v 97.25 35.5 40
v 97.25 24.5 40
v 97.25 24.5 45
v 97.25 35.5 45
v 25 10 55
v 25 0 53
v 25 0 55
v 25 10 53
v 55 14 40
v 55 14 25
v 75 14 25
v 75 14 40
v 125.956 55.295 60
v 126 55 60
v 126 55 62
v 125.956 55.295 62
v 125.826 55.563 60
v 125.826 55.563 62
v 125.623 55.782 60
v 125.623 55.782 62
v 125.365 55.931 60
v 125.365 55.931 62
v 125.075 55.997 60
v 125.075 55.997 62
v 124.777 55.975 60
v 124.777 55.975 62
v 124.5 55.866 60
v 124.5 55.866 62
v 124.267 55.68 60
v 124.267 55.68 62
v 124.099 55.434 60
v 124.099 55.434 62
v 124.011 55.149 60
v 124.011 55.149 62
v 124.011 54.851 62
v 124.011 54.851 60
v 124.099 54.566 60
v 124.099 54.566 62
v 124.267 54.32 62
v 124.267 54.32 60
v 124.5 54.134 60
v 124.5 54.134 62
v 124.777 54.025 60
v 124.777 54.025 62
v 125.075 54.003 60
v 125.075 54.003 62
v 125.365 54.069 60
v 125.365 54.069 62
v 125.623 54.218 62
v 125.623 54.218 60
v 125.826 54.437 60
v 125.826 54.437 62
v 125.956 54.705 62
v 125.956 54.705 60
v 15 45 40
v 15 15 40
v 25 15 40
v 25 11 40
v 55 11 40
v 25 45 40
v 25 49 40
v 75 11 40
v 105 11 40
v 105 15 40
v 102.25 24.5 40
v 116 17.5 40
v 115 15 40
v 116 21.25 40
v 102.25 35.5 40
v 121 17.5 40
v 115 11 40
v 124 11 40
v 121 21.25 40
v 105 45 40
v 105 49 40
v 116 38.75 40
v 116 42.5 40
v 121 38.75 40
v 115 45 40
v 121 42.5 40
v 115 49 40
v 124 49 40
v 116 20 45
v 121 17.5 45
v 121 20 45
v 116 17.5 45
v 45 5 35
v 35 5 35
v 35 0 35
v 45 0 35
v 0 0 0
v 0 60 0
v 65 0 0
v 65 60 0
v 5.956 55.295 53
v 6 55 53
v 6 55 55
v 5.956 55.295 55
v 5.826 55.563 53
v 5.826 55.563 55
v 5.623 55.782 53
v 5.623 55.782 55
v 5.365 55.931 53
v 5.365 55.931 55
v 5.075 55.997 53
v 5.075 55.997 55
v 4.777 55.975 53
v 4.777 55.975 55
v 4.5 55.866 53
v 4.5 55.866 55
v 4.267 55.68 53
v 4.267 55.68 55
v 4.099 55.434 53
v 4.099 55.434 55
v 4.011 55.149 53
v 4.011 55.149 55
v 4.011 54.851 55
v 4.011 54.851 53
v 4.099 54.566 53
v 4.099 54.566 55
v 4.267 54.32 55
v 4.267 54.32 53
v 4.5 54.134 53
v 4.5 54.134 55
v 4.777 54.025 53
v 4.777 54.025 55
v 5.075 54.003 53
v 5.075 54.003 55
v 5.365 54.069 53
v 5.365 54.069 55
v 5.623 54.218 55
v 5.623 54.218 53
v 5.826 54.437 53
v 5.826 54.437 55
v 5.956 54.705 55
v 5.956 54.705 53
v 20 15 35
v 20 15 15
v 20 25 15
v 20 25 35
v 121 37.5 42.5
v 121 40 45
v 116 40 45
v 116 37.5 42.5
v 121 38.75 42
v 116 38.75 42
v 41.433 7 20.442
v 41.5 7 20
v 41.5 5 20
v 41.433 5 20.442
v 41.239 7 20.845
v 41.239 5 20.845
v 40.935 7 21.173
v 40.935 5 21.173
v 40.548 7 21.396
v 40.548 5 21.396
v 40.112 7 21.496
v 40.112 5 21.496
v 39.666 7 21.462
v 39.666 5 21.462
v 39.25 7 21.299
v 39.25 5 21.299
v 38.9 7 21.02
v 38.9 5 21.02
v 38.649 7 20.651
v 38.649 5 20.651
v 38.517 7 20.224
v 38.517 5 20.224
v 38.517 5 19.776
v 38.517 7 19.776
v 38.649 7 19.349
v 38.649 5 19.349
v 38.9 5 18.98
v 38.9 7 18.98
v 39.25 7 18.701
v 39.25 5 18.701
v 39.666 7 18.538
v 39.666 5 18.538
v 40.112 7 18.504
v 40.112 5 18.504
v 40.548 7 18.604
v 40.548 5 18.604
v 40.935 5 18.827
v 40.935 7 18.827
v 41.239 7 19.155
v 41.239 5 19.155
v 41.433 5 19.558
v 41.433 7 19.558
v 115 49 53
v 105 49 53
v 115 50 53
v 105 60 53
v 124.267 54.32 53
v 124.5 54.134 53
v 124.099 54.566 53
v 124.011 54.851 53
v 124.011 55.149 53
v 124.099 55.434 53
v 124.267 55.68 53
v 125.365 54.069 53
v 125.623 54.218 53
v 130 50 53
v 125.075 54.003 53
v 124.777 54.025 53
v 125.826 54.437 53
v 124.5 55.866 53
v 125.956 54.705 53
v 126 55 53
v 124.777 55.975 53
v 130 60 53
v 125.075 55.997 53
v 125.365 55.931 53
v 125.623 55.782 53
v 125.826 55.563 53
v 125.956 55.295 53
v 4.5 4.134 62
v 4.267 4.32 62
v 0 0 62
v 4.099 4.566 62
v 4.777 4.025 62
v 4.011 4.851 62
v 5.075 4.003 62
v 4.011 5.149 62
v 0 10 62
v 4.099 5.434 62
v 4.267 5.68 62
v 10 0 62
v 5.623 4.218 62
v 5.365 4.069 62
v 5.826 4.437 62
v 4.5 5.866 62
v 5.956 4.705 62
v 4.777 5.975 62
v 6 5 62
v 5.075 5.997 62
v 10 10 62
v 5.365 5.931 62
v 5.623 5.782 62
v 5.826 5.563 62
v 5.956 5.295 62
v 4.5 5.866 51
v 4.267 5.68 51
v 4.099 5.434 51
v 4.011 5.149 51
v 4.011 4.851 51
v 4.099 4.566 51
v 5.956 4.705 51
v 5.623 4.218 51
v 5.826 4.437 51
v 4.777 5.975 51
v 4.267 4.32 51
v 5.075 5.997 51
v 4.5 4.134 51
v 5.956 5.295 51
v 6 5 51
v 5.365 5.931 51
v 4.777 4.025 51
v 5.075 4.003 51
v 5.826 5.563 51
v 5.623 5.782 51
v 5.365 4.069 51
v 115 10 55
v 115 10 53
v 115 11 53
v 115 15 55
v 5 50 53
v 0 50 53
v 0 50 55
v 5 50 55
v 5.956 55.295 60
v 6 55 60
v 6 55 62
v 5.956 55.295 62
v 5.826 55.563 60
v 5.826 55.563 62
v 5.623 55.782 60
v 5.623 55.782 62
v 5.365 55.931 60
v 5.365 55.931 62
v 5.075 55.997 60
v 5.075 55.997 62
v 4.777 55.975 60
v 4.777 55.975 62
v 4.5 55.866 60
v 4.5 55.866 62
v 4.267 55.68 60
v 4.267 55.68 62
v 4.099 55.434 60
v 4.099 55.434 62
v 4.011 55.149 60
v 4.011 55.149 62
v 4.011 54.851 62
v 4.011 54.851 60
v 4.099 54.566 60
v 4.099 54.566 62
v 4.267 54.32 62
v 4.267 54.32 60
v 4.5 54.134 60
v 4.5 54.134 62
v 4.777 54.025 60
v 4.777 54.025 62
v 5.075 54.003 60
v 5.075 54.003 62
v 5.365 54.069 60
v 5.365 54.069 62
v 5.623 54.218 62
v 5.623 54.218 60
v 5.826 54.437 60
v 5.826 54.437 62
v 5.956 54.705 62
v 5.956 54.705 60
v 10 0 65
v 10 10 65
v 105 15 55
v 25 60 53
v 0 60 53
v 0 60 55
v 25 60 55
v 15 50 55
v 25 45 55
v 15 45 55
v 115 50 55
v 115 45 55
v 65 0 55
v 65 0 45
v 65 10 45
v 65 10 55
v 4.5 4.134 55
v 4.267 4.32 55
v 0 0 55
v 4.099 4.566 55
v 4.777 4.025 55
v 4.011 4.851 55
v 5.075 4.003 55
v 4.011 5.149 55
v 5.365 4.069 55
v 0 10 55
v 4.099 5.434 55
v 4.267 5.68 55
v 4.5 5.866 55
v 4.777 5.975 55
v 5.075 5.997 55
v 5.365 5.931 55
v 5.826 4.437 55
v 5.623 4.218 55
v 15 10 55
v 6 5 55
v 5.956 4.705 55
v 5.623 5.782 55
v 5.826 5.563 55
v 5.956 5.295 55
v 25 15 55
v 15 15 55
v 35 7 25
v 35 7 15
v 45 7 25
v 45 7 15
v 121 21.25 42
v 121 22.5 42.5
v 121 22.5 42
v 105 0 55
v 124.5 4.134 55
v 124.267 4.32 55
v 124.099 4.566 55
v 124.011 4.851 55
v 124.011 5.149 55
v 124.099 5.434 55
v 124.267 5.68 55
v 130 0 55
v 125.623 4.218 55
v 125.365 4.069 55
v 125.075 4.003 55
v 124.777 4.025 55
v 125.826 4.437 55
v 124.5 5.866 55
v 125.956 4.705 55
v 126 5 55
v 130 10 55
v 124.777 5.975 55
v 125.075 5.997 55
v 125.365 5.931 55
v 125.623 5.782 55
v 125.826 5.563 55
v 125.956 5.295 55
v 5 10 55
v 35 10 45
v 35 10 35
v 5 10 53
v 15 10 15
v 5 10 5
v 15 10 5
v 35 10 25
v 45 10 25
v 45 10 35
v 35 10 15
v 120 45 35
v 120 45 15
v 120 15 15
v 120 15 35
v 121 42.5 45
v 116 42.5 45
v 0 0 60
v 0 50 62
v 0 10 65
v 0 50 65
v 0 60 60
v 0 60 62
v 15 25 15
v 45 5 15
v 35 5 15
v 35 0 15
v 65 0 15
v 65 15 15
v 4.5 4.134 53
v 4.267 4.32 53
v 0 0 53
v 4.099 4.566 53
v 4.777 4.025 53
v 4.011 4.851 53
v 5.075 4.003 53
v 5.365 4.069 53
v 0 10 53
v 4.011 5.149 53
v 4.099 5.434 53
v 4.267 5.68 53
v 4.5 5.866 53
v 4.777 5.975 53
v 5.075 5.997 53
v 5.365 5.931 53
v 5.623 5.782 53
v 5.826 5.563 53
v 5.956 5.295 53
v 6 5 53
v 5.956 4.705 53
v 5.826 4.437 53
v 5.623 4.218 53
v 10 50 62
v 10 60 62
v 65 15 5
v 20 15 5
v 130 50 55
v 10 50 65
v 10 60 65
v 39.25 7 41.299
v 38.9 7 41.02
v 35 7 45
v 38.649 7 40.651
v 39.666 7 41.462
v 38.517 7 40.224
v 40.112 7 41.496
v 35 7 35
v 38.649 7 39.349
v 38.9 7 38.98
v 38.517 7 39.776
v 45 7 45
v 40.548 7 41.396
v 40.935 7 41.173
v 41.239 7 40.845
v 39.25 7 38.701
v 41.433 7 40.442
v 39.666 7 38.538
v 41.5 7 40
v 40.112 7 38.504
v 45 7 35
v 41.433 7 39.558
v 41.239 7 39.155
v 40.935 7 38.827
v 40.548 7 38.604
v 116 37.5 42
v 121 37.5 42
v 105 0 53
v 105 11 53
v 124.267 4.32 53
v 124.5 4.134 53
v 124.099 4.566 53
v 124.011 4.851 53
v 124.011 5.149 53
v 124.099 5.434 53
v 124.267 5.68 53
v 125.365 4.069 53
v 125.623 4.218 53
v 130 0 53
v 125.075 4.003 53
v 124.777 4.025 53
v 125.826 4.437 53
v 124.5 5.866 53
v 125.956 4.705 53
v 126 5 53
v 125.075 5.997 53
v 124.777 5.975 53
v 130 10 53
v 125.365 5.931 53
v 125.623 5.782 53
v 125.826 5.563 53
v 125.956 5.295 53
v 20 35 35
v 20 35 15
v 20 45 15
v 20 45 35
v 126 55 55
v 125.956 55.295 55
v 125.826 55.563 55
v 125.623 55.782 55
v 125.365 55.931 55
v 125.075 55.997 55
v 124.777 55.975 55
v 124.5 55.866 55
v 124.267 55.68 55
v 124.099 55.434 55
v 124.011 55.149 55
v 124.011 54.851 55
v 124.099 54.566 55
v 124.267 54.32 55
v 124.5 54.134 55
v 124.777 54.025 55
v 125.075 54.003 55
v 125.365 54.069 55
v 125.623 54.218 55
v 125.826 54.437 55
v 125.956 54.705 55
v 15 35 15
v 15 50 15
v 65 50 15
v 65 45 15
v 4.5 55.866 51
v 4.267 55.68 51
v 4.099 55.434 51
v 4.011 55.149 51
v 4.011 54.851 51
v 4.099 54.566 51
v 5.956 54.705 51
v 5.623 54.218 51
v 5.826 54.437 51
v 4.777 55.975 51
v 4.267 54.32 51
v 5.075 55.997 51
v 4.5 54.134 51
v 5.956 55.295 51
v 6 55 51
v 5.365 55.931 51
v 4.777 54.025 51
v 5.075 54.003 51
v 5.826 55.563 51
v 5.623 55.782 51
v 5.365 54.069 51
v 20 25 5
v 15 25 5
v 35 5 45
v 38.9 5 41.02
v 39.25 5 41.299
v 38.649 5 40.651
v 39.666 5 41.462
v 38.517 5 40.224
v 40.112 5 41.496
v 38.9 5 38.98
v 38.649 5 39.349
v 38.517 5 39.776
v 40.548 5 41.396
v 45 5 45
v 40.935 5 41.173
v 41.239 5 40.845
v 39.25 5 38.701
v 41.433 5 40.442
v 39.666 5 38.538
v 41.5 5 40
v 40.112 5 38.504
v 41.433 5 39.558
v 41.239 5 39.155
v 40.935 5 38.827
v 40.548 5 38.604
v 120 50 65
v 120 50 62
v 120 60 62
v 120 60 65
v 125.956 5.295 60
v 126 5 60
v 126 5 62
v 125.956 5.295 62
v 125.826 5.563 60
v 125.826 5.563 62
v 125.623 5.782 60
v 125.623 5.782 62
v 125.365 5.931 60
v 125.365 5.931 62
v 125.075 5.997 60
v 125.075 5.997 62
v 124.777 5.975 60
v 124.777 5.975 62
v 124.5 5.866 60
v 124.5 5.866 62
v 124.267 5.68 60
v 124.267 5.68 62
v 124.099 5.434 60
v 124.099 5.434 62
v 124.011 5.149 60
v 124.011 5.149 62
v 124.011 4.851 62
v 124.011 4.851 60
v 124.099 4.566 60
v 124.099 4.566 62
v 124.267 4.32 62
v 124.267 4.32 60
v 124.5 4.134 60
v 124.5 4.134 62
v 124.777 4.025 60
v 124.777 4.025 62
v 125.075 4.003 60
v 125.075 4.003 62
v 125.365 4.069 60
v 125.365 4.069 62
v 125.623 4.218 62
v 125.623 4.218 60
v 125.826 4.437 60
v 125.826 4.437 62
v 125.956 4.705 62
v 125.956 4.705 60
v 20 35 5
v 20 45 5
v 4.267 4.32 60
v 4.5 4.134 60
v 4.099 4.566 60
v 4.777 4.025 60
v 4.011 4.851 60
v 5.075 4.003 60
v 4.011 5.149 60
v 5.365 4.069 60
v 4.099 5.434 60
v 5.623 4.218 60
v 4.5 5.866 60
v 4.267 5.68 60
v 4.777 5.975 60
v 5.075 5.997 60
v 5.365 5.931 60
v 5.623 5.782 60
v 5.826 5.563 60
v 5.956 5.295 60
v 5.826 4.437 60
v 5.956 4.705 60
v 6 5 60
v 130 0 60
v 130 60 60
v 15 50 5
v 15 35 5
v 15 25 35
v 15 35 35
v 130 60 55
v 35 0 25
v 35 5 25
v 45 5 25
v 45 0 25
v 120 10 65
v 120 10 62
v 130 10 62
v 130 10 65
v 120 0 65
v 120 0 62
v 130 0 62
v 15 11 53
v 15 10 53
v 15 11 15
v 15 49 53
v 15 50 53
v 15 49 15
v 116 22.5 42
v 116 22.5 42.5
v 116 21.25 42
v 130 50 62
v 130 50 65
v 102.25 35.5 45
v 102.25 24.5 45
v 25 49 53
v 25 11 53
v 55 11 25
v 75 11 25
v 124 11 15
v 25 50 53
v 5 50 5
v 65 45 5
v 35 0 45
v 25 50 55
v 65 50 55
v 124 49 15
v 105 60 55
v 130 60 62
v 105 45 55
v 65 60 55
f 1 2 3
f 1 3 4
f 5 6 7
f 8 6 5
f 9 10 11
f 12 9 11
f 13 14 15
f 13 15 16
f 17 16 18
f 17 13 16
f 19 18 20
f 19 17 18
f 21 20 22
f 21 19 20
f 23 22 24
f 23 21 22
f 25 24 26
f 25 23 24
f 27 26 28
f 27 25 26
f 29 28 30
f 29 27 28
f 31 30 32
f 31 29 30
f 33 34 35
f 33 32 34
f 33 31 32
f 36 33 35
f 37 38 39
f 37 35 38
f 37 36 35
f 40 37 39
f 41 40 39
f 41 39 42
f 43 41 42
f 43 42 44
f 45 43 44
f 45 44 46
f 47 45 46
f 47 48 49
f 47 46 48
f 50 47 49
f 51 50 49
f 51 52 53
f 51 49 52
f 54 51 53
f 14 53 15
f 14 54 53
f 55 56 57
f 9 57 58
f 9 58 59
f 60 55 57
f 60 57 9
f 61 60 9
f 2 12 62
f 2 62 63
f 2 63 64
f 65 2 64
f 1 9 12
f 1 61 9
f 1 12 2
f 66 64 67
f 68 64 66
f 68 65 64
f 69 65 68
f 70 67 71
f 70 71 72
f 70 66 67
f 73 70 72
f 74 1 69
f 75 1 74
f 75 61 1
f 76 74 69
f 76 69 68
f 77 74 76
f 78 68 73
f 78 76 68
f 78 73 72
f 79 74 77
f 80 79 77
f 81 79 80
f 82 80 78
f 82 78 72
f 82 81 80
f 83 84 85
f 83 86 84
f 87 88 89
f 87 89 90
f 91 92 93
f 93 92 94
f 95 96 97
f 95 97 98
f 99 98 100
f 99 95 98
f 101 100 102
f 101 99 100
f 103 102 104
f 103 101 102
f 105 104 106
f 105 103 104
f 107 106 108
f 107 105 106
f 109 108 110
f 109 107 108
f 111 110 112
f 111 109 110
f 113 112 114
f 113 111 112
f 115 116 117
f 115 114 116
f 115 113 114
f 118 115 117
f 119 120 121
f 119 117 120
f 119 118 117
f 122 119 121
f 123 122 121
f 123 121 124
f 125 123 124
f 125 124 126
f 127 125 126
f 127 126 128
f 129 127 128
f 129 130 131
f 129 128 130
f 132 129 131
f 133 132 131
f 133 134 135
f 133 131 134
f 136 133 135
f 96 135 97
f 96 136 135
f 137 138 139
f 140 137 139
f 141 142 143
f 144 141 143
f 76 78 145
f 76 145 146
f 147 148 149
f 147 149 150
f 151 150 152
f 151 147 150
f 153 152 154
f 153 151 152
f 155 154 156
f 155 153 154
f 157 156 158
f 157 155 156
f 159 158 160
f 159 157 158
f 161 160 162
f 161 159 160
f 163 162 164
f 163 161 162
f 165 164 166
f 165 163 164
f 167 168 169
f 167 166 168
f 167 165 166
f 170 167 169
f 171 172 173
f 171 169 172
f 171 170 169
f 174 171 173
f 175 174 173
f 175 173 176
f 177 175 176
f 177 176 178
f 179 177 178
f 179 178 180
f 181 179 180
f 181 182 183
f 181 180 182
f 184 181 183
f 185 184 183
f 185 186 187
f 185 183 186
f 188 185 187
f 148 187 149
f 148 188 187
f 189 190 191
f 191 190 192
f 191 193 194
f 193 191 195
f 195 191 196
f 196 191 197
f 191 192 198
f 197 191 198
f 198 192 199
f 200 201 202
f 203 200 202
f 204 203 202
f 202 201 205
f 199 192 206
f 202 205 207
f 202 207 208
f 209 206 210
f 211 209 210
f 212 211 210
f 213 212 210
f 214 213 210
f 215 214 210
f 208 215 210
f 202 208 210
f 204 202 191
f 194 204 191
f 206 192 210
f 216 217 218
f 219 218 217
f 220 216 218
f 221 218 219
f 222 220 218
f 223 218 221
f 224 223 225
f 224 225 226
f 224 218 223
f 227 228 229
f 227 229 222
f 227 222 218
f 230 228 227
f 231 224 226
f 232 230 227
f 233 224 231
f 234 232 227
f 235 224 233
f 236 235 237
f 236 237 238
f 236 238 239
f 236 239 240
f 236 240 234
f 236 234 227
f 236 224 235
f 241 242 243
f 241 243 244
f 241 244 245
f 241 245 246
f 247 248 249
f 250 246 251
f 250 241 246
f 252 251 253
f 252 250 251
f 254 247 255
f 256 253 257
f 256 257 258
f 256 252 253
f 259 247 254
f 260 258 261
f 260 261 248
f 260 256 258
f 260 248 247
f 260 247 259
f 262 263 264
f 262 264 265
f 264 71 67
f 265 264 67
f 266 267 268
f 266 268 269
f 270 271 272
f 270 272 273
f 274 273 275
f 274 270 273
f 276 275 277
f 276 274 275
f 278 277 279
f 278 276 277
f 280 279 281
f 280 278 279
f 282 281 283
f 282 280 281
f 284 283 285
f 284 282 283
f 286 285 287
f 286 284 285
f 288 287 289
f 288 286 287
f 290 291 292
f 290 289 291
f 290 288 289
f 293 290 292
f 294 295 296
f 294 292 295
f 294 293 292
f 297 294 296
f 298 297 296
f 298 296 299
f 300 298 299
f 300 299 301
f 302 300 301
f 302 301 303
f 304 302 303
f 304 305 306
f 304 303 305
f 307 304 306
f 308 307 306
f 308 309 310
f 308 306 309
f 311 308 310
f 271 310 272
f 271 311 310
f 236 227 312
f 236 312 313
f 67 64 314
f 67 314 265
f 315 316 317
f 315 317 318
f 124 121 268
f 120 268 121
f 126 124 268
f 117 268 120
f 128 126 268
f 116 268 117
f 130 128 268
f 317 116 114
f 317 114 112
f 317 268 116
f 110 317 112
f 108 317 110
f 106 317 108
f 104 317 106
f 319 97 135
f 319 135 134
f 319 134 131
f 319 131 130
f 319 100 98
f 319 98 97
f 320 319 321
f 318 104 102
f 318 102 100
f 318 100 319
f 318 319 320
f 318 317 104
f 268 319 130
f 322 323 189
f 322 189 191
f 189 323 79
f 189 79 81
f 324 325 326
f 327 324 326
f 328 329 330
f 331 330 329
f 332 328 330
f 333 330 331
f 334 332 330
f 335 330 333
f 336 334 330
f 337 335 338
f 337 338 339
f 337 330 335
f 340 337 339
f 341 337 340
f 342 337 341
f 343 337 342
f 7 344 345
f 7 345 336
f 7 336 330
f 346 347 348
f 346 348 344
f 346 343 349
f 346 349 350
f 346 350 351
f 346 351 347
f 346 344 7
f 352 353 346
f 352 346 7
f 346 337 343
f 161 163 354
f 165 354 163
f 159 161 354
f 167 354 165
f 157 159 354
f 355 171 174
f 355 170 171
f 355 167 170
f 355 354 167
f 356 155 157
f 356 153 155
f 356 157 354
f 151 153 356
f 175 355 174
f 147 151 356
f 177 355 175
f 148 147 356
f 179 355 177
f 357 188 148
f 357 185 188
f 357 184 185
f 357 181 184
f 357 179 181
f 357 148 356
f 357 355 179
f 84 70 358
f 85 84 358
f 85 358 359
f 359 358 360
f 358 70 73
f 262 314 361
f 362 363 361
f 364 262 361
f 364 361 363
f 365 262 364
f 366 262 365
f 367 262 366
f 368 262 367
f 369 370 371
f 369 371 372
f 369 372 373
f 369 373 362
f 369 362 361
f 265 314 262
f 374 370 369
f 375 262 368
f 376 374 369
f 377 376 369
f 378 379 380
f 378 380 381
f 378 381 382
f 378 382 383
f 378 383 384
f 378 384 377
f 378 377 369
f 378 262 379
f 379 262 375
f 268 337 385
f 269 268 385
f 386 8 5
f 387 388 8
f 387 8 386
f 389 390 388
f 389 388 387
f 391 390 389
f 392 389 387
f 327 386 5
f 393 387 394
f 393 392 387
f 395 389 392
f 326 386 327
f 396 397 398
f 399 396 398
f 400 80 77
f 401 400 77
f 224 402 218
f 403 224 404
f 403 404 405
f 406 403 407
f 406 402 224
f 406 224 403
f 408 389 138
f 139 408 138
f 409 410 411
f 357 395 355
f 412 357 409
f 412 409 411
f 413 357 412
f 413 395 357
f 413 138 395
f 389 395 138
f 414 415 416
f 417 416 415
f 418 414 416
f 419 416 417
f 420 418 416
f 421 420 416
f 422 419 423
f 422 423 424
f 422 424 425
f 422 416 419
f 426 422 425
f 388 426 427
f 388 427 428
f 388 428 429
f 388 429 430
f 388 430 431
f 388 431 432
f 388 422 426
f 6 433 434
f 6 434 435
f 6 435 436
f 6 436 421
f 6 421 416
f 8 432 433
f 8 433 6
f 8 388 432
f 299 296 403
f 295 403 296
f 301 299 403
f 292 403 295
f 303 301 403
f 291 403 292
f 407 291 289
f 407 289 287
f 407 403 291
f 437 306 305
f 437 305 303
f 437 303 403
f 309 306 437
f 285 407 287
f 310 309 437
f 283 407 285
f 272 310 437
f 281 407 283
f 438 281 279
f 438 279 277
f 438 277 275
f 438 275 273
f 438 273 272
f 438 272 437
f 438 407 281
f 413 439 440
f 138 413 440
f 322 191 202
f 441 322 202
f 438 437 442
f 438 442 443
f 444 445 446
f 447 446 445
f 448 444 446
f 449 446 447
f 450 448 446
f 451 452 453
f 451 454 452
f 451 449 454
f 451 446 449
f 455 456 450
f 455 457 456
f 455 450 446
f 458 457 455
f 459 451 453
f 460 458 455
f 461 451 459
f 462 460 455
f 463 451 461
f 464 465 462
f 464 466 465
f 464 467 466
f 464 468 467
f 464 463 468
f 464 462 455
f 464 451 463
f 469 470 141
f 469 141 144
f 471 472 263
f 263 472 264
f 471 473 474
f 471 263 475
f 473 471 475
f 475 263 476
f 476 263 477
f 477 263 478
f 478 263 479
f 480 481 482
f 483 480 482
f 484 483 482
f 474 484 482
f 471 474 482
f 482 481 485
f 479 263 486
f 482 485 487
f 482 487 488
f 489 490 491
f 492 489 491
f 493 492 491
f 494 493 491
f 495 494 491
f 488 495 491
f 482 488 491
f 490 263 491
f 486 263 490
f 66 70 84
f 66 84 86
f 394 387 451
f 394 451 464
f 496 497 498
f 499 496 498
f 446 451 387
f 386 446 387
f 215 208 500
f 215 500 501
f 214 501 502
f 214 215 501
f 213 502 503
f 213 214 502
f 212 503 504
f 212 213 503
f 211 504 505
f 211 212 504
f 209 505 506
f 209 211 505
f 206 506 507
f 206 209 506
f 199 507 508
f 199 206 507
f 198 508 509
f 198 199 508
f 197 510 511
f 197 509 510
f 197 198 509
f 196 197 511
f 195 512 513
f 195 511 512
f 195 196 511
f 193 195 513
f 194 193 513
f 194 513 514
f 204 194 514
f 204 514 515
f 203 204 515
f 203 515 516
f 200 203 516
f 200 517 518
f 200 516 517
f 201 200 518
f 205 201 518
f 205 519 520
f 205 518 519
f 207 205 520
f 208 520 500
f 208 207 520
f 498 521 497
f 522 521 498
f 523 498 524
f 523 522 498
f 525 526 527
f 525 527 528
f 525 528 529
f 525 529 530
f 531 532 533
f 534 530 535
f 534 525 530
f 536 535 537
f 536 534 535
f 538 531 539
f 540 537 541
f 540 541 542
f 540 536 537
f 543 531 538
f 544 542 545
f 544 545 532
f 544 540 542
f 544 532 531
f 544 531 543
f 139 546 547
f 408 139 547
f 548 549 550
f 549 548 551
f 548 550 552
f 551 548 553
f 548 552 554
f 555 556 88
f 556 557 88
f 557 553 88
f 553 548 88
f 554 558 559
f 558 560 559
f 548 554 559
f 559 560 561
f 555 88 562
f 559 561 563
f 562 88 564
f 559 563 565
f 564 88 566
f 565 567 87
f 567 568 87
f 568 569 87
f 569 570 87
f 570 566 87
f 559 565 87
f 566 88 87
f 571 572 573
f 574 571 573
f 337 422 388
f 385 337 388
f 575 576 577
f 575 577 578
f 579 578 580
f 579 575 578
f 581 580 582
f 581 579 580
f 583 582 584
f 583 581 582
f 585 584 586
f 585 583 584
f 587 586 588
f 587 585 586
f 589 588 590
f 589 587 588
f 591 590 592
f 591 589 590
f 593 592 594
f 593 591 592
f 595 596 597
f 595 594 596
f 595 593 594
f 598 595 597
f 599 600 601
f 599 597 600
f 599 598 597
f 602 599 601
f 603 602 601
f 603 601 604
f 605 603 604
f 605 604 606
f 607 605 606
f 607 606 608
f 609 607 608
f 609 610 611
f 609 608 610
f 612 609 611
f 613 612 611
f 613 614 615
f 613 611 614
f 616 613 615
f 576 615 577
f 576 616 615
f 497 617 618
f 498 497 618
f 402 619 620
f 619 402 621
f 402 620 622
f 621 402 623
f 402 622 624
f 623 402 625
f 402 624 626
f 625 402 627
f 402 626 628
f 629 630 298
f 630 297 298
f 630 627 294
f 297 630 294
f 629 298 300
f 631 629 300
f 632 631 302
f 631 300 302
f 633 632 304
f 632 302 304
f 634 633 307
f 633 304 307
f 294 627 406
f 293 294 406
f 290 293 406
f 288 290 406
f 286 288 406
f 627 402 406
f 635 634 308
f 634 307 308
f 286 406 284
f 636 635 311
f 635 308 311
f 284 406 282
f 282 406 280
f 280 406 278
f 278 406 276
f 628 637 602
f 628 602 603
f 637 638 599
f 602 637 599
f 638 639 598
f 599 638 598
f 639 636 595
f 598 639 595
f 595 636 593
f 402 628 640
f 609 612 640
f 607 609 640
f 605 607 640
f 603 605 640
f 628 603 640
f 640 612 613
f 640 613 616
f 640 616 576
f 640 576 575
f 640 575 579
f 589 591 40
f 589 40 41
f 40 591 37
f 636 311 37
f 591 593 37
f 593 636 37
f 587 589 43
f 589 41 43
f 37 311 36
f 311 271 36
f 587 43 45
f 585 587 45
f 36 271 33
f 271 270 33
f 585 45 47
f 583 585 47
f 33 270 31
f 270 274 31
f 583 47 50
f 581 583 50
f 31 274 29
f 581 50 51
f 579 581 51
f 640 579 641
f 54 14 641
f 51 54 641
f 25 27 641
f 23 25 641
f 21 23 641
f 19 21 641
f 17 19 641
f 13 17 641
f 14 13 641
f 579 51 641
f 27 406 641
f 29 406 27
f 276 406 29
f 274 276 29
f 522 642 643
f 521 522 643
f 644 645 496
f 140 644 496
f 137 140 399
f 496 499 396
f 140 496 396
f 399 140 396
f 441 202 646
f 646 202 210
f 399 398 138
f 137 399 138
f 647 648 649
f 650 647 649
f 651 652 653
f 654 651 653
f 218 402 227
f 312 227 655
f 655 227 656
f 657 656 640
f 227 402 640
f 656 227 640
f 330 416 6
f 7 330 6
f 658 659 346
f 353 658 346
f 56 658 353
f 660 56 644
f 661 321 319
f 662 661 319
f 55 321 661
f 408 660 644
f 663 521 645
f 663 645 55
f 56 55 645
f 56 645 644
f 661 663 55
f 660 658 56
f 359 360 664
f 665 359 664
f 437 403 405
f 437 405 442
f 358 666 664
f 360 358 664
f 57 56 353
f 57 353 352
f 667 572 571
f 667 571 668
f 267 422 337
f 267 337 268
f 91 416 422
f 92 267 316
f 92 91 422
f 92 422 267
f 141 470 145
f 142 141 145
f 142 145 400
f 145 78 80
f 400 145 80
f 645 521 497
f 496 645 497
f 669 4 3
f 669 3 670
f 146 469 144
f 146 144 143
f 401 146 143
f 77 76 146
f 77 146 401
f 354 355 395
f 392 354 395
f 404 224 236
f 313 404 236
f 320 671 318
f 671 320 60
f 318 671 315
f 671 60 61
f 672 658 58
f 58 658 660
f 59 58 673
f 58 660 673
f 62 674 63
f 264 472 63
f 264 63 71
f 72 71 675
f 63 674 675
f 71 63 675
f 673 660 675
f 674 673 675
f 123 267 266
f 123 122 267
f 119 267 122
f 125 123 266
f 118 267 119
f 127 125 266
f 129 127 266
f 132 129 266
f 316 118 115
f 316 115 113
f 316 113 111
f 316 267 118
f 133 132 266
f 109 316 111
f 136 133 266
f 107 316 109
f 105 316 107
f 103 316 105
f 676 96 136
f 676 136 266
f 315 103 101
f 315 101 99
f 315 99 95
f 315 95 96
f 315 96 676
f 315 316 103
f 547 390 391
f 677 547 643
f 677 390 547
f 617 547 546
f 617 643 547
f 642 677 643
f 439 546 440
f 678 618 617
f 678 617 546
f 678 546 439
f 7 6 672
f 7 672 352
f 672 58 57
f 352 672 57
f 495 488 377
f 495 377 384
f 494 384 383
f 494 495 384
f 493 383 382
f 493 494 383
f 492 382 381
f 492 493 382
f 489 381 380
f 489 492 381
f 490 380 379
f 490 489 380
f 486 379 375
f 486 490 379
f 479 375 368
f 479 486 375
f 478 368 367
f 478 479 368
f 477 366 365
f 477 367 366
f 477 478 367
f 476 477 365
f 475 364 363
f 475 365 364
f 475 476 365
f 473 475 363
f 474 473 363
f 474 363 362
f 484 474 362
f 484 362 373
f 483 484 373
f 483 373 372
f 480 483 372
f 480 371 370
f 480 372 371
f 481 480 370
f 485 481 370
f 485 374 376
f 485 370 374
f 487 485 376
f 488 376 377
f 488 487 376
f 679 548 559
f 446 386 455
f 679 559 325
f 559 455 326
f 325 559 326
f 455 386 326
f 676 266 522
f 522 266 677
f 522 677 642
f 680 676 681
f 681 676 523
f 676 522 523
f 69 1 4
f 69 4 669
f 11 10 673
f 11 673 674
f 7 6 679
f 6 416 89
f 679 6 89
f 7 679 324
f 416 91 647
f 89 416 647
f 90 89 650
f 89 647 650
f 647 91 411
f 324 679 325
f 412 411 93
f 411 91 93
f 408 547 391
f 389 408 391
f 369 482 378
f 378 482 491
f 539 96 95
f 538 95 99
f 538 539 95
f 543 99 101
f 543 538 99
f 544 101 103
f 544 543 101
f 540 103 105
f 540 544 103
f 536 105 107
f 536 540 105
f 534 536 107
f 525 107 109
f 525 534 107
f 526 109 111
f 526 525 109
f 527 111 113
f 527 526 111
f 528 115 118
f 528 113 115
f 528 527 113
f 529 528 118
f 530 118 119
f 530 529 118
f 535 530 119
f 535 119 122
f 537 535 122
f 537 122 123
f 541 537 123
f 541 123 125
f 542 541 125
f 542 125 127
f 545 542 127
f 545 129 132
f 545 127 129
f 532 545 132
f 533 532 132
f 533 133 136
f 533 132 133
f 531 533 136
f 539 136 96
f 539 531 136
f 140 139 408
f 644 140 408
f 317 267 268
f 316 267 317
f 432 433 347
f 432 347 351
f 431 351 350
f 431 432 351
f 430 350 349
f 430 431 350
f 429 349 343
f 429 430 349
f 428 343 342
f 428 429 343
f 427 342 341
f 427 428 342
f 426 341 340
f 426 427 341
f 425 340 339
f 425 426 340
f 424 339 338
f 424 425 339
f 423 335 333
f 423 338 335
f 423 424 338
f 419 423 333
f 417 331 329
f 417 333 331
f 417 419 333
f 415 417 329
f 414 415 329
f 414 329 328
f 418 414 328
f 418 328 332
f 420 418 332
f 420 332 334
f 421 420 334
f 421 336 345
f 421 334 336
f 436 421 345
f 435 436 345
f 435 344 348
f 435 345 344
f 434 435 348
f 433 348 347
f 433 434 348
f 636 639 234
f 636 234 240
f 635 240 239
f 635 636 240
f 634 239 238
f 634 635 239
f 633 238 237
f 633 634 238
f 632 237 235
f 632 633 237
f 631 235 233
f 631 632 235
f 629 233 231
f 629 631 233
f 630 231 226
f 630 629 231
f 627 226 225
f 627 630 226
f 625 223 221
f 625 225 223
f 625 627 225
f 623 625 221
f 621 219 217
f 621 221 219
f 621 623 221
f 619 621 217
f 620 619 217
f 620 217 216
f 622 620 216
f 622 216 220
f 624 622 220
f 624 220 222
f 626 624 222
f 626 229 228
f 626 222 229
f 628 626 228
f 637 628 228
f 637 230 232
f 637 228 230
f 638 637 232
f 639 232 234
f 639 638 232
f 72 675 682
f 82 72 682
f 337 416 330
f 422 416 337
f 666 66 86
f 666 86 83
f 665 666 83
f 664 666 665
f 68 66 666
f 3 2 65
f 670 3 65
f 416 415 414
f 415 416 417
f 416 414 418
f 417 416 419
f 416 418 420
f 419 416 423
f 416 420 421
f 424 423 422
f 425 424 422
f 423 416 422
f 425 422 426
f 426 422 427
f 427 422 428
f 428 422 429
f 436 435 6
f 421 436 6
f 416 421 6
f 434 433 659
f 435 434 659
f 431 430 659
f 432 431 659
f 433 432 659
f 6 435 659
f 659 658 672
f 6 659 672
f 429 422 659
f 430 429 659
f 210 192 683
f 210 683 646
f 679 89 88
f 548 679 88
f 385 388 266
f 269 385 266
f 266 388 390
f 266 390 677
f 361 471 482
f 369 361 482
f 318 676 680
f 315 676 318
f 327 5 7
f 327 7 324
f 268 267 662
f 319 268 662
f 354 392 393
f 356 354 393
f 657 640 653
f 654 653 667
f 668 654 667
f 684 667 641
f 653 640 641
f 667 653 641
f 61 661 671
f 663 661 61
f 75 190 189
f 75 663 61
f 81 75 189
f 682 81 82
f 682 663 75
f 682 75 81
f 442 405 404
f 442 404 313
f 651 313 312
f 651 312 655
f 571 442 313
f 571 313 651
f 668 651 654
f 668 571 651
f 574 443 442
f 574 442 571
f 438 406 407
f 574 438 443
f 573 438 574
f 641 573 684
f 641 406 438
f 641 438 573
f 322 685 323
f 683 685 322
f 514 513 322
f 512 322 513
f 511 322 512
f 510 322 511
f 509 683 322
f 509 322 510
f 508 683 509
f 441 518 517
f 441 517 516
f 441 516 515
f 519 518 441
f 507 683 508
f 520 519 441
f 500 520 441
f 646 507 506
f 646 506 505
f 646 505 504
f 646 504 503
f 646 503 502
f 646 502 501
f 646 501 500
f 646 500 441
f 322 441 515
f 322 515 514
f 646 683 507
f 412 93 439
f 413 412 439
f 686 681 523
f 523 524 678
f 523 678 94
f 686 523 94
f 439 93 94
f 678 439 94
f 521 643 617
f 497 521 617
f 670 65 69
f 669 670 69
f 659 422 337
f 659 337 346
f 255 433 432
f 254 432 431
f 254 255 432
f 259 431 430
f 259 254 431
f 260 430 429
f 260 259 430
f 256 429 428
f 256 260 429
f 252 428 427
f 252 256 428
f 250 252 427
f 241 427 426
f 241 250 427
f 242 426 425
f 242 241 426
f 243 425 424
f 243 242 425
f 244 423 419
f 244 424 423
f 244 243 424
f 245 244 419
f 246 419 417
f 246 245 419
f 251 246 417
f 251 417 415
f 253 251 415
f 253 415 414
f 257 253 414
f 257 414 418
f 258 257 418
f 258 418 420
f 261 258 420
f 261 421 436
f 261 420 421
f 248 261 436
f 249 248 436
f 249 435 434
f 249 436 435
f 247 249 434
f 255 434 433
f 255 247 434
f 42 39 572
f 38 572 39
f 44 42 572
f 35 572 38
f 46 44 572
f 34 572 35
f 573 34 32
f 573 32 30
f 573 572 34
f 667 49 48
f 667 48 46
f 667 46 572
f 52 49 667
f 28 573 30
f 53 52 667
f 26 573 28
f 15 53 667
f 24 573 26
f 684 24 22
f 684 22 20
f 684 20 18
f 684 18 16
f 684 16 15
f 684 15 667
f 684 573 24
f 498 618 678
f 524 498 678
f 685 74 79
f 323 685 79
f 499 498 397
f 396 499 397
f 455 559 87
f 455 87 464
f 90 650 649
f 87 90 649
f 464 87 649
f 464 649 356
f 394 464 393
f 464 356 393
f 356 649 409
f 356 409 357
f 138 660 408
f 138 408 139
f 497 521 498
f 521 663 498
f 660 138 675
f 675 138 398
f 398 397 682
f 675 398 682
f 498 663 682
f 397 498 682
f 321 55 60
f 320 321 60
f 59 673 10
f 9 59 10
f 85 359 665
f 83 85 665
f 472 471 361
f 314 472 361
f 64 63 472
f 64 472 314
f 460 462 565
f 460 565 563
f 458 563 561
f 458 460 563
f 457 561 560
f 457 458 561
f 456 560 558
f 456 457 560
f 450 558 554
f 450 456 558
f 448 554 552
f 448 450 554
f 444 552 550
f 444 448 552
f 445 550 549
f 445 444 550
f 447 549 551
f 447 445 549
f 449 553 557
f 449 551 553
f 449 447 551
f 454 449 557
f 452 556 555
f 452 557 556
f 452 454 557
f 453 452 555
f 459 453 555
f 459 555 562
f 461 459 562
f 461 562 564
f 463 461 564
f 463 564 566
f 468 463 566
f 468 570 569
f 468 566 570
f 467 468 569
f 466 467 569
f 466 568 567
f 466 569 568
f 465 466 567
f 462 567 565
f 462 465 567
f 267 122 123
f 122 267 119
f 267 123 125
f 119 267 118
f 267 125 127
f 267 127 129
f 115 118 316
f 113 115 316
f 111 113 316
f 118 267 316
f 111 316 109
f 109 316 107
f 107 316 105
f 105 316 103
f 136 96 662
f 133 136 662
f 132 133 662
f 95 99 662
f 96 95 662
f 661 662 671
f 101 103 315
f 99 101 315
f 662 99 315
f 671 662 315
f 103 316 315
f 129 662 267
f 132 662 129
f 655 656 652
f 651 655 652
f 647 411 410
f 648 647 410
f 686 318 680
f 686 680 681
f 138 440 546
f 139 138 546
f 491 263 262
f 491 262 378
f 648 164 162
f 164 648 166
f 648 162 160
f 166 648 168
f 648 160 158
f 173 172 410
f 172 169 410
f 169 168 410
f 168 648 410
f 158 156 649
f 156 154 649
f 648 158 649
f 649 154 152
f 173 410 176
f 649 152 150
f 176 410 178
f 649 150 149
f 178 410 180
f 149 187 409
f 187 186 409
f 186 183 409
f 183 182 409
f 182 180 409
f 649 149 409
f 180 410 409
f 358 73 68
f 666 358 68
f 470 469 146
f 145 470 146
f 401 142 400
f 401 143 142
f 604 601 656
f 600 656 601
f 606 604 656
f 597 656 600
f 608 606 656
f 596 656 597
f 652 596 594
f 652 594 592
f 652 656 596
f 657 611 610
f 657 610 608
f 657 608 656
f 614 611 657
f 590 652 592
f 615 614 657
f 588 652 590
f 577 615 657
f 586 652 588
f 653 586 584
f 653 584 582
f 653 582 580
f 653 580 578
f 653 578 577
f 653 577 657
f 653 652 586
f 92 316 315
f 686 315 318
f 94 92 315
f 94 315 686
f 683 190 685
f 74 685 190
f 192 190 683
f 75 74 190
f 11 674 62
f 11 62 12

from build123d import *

# Parameters (mm, degrees)
CYLINDER002_R           = 1
CYLINDER002_DEPTH       = 20
BOX007_W                = 10
BOX007_H                = 10
BOX007_DEPTH            = 10
ARRAY005_X_COUNT        = 2
ARRAY005_X_PITCH        = 120
ARRAY005_Y_COUNT        = 2
ARRAY005_Y_PITCH        = 50
BOX002_W                = 130
BOX002_H                = 60
BOX002_DEPTH            = 5
BOX015_W                = 20
BOX015_H                = 3
BOX015_DEPTH            = 15
CYLINDER003_R           = 1
CYLINDER003_DEPTH       = 10
ARRAY009_X_COUNT        = 2
ARRAY009_X_PITCH        = 120
ARRAY009_Y_COUNT        = 2
ARRAY009_Y_PITCH        = 50
BOX011_W                = 25
BOX011_H                = 10
BOX011_DEPTH            = 2
ARRAY008_X_COUNT        = 2
ARRAY008_X_PITCH        = 105
ARRAY008_Y_COUNT        = 2
ARRAY008_Y_PITCH        = 50
BOX010_W                = 10
BOX010_H                = 15
BOX010_DEPTH            = 2
ARRAY007_X_COUNT        = 2
ARRAY007_X_PITCH        = 90
ARRAY007_Y_COUNT        = 2
ARRAY007_Y_PITCH        = 45
BOX009_W                = 10
BOX009_H                = 4
BOX009_DEPTH            = 15
ARRAY006_X_COUNT        = 2
ARRAY006_X_PITCH        = 90
ARRAY006_Y_COUNT        = 2
ARRAY006_Y_PITCH        = 34
BOX008_W                = 109
BOX008_H                = 38
BOX008_DEPTH            = 5
PAD001_DEPTH            = 20
SKETCH002_W             = 5
SKETCH002_H             = 11
PAD002_DEPTH            = 5
BOX013_W                = 17.5
BOX013_H                = 5
BOX013_DEPTH            = 2
BOX012_W                = 5
BOX012_H                = 5
BOX012_DEPTH            = 5
ARRAY010_X_COUNT        = 2
ARRAY010_X_PITCH        = 20
CHAMFER_SIZE            = 2.5
CHAMFER_PLACEMENT_ANGLE = 90
BOX016_W                = 65
BOX016_H                = 60
BOX016_DEPTH            = 60
BOX014_W                = 7
BOX014_H                = 15
BOX014_DEPTH            = 10
CYLINDER001_R           = 1
CYLINDER001_DEPTH       = 3
ARRAY004_X_COUNT        = 2
ARRAY004_X_PITCH        = 120
ARRAY004_Y_COUNT        = 2
ARRAY004_Y_PITCH        = 50
CYLINDER_R              = 1.5
CYLINDER_DEPTH          = 30
CYLINDER_ROLL_ANGLE     = 90
ARRAY003_X_COUNT        = 2
ARRAY003_X_PITCH        = 50
ARRAY003_Y_COUNT        = 2
ARRAY003_Y_PITCH        = 20
BOX006_W                = 25
BOX006_H                = 10
BOX006_DEPTH            = 2
ARRAY002_X_COUNT        = 2
ARRAY002_X_PITCH        = 105
ARRAY002_Y_COUNT        = 2
ARRAY002_Y_PITCH        = 50
BOX005_W                = 10
BOX005_H                = 10
BOX005_DEPTH            = 10
ARRAY001_X_COUNT        = 2
ARRAY001_X_PITCH        = 50
BOX004_W                = 10
BOX004_H                = 2
BOX004_DEPTH            = 10
ARRAY_X_COUNT           = 2
ARRAY_X_PITCH           = 50
ARRAY_Y_COUNT           = 2
ARRAY_Y_PITCH           = 20
BOX003_W                = 60
BOX003_H                = 10
BOX003_DEPTH            = 30
BOX001_W                = 120
BOX001_H                = 40
BOX001_DEPTH            = 50
BOX_W                   = 130
BOX_H                   = 60
BOX_DEPTH               = 55
PAD_DEPTH               = 10


with BuildPart() as cilindro002:
    # Cylinder002 → Cylinder002 (new body)
    with BuildSketch(Plane(origin=(5, 5, -5), x_dir=(1, 0, 0), z_dir=(0, 0, 1))):
        Circle(CYLINDER002_R)
    extrude(amount=CYLINDER002_DEPTH)


with BuildPart() as huecostapa:
    # Box007 → Box007 (new body)
    with BuildSketch(Plane.XY):
        with Locations((5, 5)):
            Rectangle(BOX007_W, BOX007_H)
    extrude(amount=BOX007_DEPTH)

    # Fusion: union Cilindro002
    add(cilindro002.part)

    # Array005 X: HuecosTapa ×2


with BuildPart() as huecostapa_1:
    add(huecostapa.part)
    with Locations(*[(i * ARRAY005_X_PITCH, 0, 0) for i in range(1, ARRAY005_X_COUNT)]):
        add(huecostapa.part)

    # Array005 Y: HuecosTapa ×2


with BuildPart() as huecostapa_2:
    add(huecostapa_1.part)
    with Locations(*[(0, i * ARRAY005_Y_PITCH, 0) for i in range(1, ARRAY005_Y_COUNT)]):
        add(huecostapa_1.part)


with BuildPart() as huecostapa_3:
    # Array005 placement: moved
    add(huecostapa_2.part.moved(Location((0, 0, 62))))


with BuildPart() as tapa:
    # Box002 → Box002 (new body)
    with BuildSketch(Plane.XY.offset(60)):
        with Locations((65, 30)):
            Rectangle(BOX002_W, BOX002_H)
    extrude(amount=BOX002_DEPTH)

    # Cut007: cut HuecosTapa
    add(huecostapa_3.part, mode=Mode.SUBTRACT)


with BuildPart() as hueco_tornillo_conector:
    # Box015 → Box015 (new body)
    with BuildSketch(Plane(origin=(55, 11, 25), x_dir=(1, 0, 0), z_dir=(0, 0, 1))):
        with Locations((10, 1.5)):
            Rectangle(BOX015_W, BOX015_H)
    extrude(amount=BOX015_DEPTH)


with BuildPart() as array009:
    # Cylinder003 → Cylinder003 (new body)
    with BuildSketch(Plane.XY):
        Circle(CYLINDER003_R)
    extrude(amount=CYLINDER003_DEPTH)

    # Array009 X: Array009 ×2


with BuildPart() as array009_1:
    add(array009.part)
    with Locations(*[(i * ARRAY009_X_PITCH, 0, 0) for i in range(1, ARRAY009_X_COUNT)]):
        add(array009.part)

    # Array009 Y: Array009 ×2


with BuildPart() as array009_2:
    add(array009_1.part)
    with Locations(*[(0, i * ARRAY009_Y_PITCH, 0) for i in range(1, ARRAY009_Y_COUNT)]):
        add(array009_1.part)


with BuildPart() as array009_3:
    # Array009 placement: moved
    add(array009_2.part.moved(Location((-10, -6, 13))))


with BuildPart() as array008:
    # Box011 → Box011 (new body)
    with BuildSketch(Plane(origin=(-15, -11, 18), x_dir=(1, 0, 0), z_dir=(0, 0, 1))):
        with Locations((12.5, 5)):
            Rectangle(BOX011_W, BOX011_H)
    extrude(amount=BOX011_DEPTH)

    # Array008 X: Array008 ×2


with BuildPart() as array008_1:
    add(array008.part)
    with Locations(*[(i * ARRAY008_X_PITCH, 0, 0) for i in range(1, ARRAY008_X_COUNT)]):
        add(array008.part)

    # Array008 Y: Array008 ×2


with BuildPart() as array008_2:
    add(array008_1.part)
    with Locations(*[(0, i * ARRAY008_Y_PITCH, 0) for i in range(1, ARRAY008_Y_COUNT)]):
        add(array008_1.part)


with BuildPart() as array007:
    # Box010 → Box010 (new body)
    with BuildSketch(Plane(origin=(0, -11, 18), x_dir=(1, 0, 0), z_dir=(0, 0, 1))):
        with Locations((5, 7.5)):
            Rectangle(BOX010_W, BOX010_H)
    extrude(amount=BOX010_DEPTH)

    # Array007 X: Array007 ×2


with BuildPart() as array007_1:
    add(array007.part)
    with Locations(*[(i * ARRAY007_X_PITCH, 0, 0) for i in range(1, ARRAY007_X_COUNT)]):
        add(array007.part)

    # Array007 Y: Array007 ×2


with BuildPart() as array007_2:
    add(array007_1.part)
    with Locations(*[(0, i * ARRAY007_Y_PITCH, 0) for i in range(1, ARRAY007_Y_COUNT)]):
        add(array007_1.part)


with BuildPart() as array006:
    # Box009 → Box009 (new body)
    with BuildSketch(Plane.XY.offset(5)):
        with Locations((5, 2)):
            Rectangle(BOX009_W, BOX009_H)
    extrude(amount=BOX009_DEPTH)

    # Array006 X: Array006 ×2


with BuildPart() as array006_1:
    add(array006.part)
    with Locations(*[(i * ARRAY006_X_PITCH, 0, 0) for i in range(1, ARRAY006_X_COUNT)]):
        add(array006.part)

    # Array006 Y: Array006 ×2


with BuildPart() as array006_2:
    add(array006_1.part)
    with Locations(*[(0, i * ARRAY006_Y_PITCH, 0) for i in range(1, ARRAY006_Y_COUNT)]):
        add(array006_1.part)


with BuildPart() as cut008:
    # Box008 → Box008 (new body)
    with BuildSketch(Plane.XY):
        with Locations((54.5, 19)):
            Rectangle(BOX008_W, BOX008_H)
    extrude(amount=BOX008_DEPTH)

    # Fusion001: union Array006
    add(array006_2.part)

    # Fusion002: union Array007
    add(array007_2.part)

    # Fusion003: union Array008
    add(array008_2.part)

    # Cut008: cut Array009
    add(array009_3.part, mode=Mode.SUBTRACT)


with BuildPart() as cut008_1:
    # Cut008 placement: moved
    add(cut008.part.moved(Location((0, 0, 20))))


with BuildPart() as cut011:
    # Sketch001 → Pad001 (new body)
    with BuildSketch(Plane.XY):
        Polygon((0, 24), (5, 24), (5, 34), (105, 34), (105, 4), (5, 4), (5, 14), (0, 14), (0, 0), (109, 0), (109, 38), (0, 38), align=None)
    extrude(amount=PAD001_DEPTH)

    # Fusion004: union Cut008
    add(cut008_1.part)


with BuildPart() as cut011_1:
    # Fusion004 placement: moved
    add(cut011.part.moved(Location((15, 11, 15))))

    # Sketch002 (on Face19 of Fusion004) → Pad002 (new body)
    with BuildSketch(Plane(origin=(15, 11, 40), x_dir=(1, 0, 0), z_dir=(0, 0, 1))):
        with Locations((84.75, 19)):
            Rectangle(SKETCH002_W, SKETCH002_H)
    extrude(amount=PAD002_DEPTH)

    # Cut011: cut Hueco_Tornillo_Conector
    add(hueco_tornillo_conector.part, mode=Mode.SUBTRACT)


with BuildPart() as clavijas_hueco:
    # Box013 → Box013 (new body)
    with BuildSketch(Plane(origin=(3.75, 0, 0), x_dir=(1, 0, 0), z_dir=(0, 0, 1))):
        with Locations((8.75, 2.5)):
            Rectangle(BOX013_W, BOX013_H)
    extrude(amount=BOX013_DEPTH)


with BuildPart() as soporte:
    # Box012 → Box012 (new body)
    with BuildSketch(Plane.XY):
        with Locations((2.5, 2.5)):
            Rectangle(BOX012_W, BOX012_H)
    extrude(amount=BOX012_DEPTH)

    # Array010 X: Soporte ×2


with BuildPart() as soporte_1:
    add(soporte.part)
    with Locations(*[(i * ARRAY010_X_PITCH, 0, 0) for i in range(1, ARRAY010_X_COUNT)]):
        add(soporte.part)

    # Cut009: cut Clavijas_hueco
    add(clavijas_hueco.part, mode=Mode.SUBTRACT)

    # Chamfer
    chamfer_edges = [soporte_1.edges().sort_by_distance(p)[0] for p in [
        (5, 2.5, 5),
        (20, 2.5, 5),
    ]]
    chamfer(chamfer_edges, length=CHAMFER_SIZE)


with BuildPart() as soporte_2:
    # Chamfer placement: moved
    add(soporte_1.part.moved(Location((121, 17.5, 40))).rotate(Axis((121, 17.5, 40), (0, 0, 1)), CHAMFER_PLACEMENT_ANGLE))

    # Fusion005: union Cut011
    add(cut011_1.part)


with BuildPart() as corte:
    # Box016 → Box016 (new body)
    with BuildSketch(Plane(origin=(65, 0, 0), x_dir=(1, 0, 0), z_dir=(0, 0, 1))):
        with Locations((32.5, 30)):
            Rectangle(BOX016_W, BOX016_H)
    extrude(amount=BOX016_DEPTH)


with BuildPart() as huecousb:
    # Box014 → Box014 (new body)
    with BuildSketch(Plane(origin=(124, 22.5, 41), x_dir=(1, 0, 0), z_dir=(0, 0, 1))):
        with Locations((3.5, 7.5)):
            Rectangle(BOX014_W, BOX014_H)
    extrude(amount=BOX014_DEPTH)


with BuildPart() as array004:
    # Cylinder001 → Cylinder001 (new body)
    with BuildSketch(Plane.XY):
        Circle(CYLINDER001_R)
    extrude(amount=CYLINDER001_DEPTH)

    # Array004 X: Array004 ×2


with BuildPart() as array004_1:
    add(array004.part)
    with Locations(*[(i * ARRAY004_X_PITCH, 0, 0) for i in range(1, ARRAY004_X_COUNT)]):
        add(array004.part)

    # Array004 Y: Array004 ×2


with BuildPart() as array004_2:
    add(array004_1.part)
    with Locations(*[(0, i * ARRAY004_Y_PITCH, 0) for i in range(1, ARRAY004_Y_COUNT)]):
        add(array004_1.part)


with BuildPart() as array004_3:
    # Array004 placement: moved
    add(array004_2.part.moved(Location((5, 5, 51))))


with BuildPart() as array003:
    # Cylinder → Cylinder (new body)
    with BuildSketch(Plane.XY):
        Circle(CYLINDER_R)
    extrude(amount=CYLINDER_DEPTH)


with BuildPart() as array003_1:
    # Cylinder roll: moved
    add(array003.part.rotate(Axis((0, 0, 0), (1, 0, 0)), CYLINDER_ROLL_ANGLE))


with BuildPart() as array003_2:
    # Cylinder placement: moved
    add(array003_1.part)

    # Array003 X: Array003 ×2


with BuildPart() as array003_3:
    add(array003_2.part)
    with Locations(*[(i * ARRAY003_X_PITCH, 0, 0) for i in range(1, ARRAY003_X_COUNT)]):
        add(array003_2.part)

    # Array003 Y: Array003 ×2


with BuildPart() as array003_4:
    add(array003_3.part)
    with Locations(*[(0, 0, i * ARRAY003_Y_PITCH) for i in range(1, ARRAY003_Y_COUNT)]):
        add(array003_3.part)


with BuildPart() as array003_5:
    # Array003 placement: moved
    add(array003_4.part.moved(Location((40, 15, 20))))


with BuildPart() as array002:
    # Box006 → Box006 (new body)
    with BuildSketch(Plane.XY):
        with Locations((12.5, 5)):
            Rectangle(BOX006_W, BOX006_H)
    extrude(amount=BOX006_DEPTH)

    # Array002 X: Array002 ×2


with BuildPart() as array002_1:
    add(array002.part)
    with Locations(*[(i * ARRAY002_X_PITCH, 0, 0) for i in range(1, ARRAY002_X_COUNT)]):
        add(array002.part)

    # Array002 Y: Array002 ×2


with BuildPart() as array002_2:
    add(array002_1.part)
    with Locations(*[(0, i * ARRAY002_Y_PITCH, 0) for i in range(1, ARRAY002_Y_COUNT)]):
        add(array002_1.part)


with BuildPart() as array002_3:
    # Array002 placement: moved
    add(array002_2.part.moved(Location((0, 0, 53))))


with BuildPart() as array001:
    # Box005 → Box005 (new body)
    with BuildSketch(Plane(origin=(35, 0, 25), x_dir=(1, 0, 0), z_dir=(0, 0, 1))):
        with Locations((5, 5)):
            Rectangle(BOX005_W, BOX005_H)
    extrude(amount=BOX005_DEPTH)

    # Array001 X: Array001 ×2


with BuildPart() as array001_1:
    add(array001.part)
    with Locations(*[(i * ARRAY001_X_PITCH, 0, 0) for i in range(1, ARRAY001_X_COUNT)]):
        add(array001.part)


with BuildPart() as array:
    # Box004 → Box004 (new body)
    with BuildSketch(Plane.XY):
        with Locations((5, 1)):
            Rectangle(BOX004_W, BOX004_H)
    extrude(amount=BOX004_DEPTH)

    # Array X: Array ×2


with BuildPart() as array_1:
    add(array.part)
    with Locations(*[(i * ARRAY_X_PITCH, 0, 0) for i in range(1, ARRAY_X_COUNT)]):
        add(array.part)

    # Array Y: Array ×2


with BuildPart() as array_2:
    add(array_1.part)
    with Locations(*[(0, 0, i * ARRAY_Y_PITCH) for i in range(1, ARRAY_Y_COUNT)]):
        add(array_1.part)


with BuildPart() as array_3:
    # Array placement: moved
    add(array_2.part.moved(Location((0, 5, 0))))


with BuildPart() as cut002:
    # Box003 → Box003 (new body)
    with BuildSketch(Plane.XY):
        with Locations((30, 5)):
            Rectangle(BOX003_W, BOX003_H)
    extrude(amount=BOX003_DEPTH)

    # Cut001: cut Array
    add(array_3.part, mode=Mode.SUBTRACT)


with BuildPart() as cut002_1:
    # Cut001 placement: moved
    add(cut002.part.moved(Location((35, 0, 15))))

    # Cut002: cut Array001
    add(array001_1.part, mode=Mode.SUBTRACT)


with BuildPart() as interior:
    # Box001 → Box001 (new body)
    with BuildSketch(Plane(origin=(5, 10, 5), x_dir=(1, 0, 0), z_dir=(0, 0, 1))):
        with Locations((60, 20)):
            Rectangle(BOX001_W, BOX001_H)
    extrude(amount=BOX001_DEPTH)


with BuildPart() as seccionyz:
    # Box → Box (new body)
    with BuildSketch(Plane.XY):
        with Locations((65, 30)):
            Rectangle(BOX_W, BOX_H)
    extrude(amount=BOX_DEPTH)

    # Cut: cut Interior
    add(interior.part, mode=Mode.SUBTRACT)

    # Cut003: cut Cut002
    add(cut002_1.part, mode=Mode.SUBTRACT)

    # Cut004: cut Array002
    add(array002_3.part, mode=Mode.SUBTRACT)

    # Sketch (on Face54 of Cut004) → Pad (new body)
    with BuildSketch(Plane.XY.offset(5)):
        Polygon((15, 35), (20, 35), (20, 45), (120, 45), (120, 15), (20, 15), (20, 25), (15, 25), (15, 10), (125, 10), (125, 50), (15, 50), align=None)
    extrude(amount=PAD_DEPTH)

    # Cut005: cut Array003
    add(array003_5.part, mode=Mode.SUBTRACT)

    # Cut006: cut Array004
    add(array004_3.part, mode=Mode.SUBTRACT)

    # Cut010: cut HuecoUSB
    add(huecousb.part, mode=Mode.SUBTRACT)

    # Cut012: cut Corte
    add(corte.part, mode=Mode.SUBTRACT)


solid = Compound([tapa.part, soporte_2.part, seccionyz.part])
